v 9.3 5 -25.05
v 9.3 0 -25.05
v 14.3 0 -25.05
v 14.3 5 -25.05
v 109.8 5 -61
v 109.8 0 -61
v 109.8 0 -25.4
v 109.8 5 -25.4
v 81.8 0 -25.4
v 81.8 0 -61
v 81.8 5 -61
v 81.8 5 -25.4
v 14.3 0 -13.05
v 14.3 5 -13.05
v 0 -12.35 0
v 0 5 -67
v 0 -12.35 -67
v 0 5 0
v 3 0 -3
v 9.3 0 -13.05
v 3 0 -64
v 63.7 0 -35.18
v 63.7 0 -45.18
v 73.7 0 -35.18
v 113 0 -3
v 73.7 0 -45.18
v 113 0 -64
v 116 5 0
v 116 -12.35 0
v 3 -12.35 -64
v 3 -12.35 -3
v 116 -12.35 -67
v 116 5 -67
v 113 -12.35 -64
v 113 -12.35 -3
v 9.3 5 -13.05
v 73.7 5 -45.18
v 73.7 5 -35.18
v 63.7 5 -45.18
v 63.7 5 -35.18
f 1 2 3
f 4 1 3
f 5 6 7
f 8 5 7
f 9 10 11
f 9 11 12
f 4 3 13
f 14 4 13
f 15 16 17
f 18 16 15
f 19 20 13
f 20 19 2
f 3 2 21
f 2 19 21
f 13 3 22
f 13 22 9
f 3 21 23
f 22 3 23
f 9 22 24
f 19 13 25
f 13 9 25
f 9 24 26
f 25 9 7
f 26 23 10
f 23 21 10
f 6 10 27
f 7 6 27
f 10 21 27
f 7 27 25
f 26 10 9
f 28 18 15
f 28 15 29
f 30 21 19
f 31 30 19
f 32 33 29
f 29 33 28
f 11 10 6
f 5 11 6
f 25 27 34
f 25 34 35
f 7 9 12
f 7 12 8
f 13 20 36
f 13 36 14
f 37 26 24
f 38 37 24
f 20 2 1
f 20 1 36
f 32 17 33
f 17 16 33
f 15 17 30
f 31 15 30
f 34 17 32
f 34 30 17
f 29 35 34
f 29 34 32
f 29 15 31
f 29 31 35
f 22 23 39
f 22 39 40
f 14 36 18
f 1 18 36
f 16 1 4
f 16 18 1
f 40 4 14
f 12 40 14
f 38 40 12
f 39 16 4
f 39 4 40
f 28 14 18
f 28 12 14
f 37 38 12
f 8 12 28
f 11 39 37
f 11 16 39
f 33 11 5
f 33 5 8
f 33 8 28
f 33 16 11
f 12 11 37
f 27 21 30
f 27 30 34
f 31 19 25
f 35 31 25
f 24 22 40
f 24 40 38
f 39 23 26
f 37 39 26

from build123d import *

# Parameters (mm, degrees)
SKETCH1_W           = 116
SKETCH1_H           = 67
BOSS_EXTRUDE1_DEPTH = 5
SKETCH2_W           = 116
SKETCH2_H           = 67
SKETCH2_W_2         = 110
SKETCH2_H_2         = 61
BOSS_EXTRUDE2_DEPTH = 12.35
SKETCH3_W           = 28
SKETCH3_H           = 35.6
CUT_EXTRUDE1_DEPTH  = 135.527032599
SKETCH4_W           = 10
SKETCH4_H           = 10
CUT_EXTRUDE2_DEPTH  = 135.527032599
SKETCH5_W           = 5
SKETCH5_H           = 12
CUT_EXTRUDE3_DEPTH  = 135.527032599


with BuildPart() as part:
    # Sketch1 → Boss-Extrude1 (new body)
    with BuildSketch(Plane(origin=(0, 0, 0), x_dir=(1, 0, 0), z_dir=(0, 1, 0))):
        with Locations((58, 33.5)):
            Rectangle(SKETCH1_W, SKETCH1_H)
    extrude(amount=BOSS_EXTRUDE1_DEPTH)

    # Sketch2 → Boss-Extrude2 (add)
    with BuildSketch(Plane.XZ):
        with Locations((58, -33.5)):
            Rectangle(SKETCH2_W, SKETCH2_H)
        with Locations((58, -33.5)):
            Rectangle(SKETCH2_W_2, SKETCH2_H_2, mode=Mode.SUBTRACT)
    extrude(amount=BOSS_EXTRUDE2_DEPTH)

    # Sketch3 → Cut-Extrude1 (cut, through all)
    with BuildSketch(Plane.XZ):
        with Locations((95.8, -43.2)):
            Rectangle(SKETCH3_W, SKETCH3_H)
    extrude(amount=-CUT_EXTRUDE1_DEPTH, mode=Mode.SUBTRACT)

    # Sketch4 → Cut-Extrude2 (cut, through all)
    with BuildSketch(Plane.XZ):
        with Locations((68.7, -40.18)):
            Rectangle(SKETCH4_W, SKETCH4_H)
    extrude(amount=-CUT_EXTRUDE2_DEPTH, mode=Mode.SUBTRACT)

    # Sketch5 → Cut-Extrude3 (cut, through all)
    with BuildSketch(Plane.XZ):
        with Locations((11.8, -19.05)):
            Rectangle(SKETCH5_W, SKETCH5_H)
    extrude(amount=-CUT_EXTRUDE3_DEPTH, mode=Mode.SUBTRACT)


solid = part.part
